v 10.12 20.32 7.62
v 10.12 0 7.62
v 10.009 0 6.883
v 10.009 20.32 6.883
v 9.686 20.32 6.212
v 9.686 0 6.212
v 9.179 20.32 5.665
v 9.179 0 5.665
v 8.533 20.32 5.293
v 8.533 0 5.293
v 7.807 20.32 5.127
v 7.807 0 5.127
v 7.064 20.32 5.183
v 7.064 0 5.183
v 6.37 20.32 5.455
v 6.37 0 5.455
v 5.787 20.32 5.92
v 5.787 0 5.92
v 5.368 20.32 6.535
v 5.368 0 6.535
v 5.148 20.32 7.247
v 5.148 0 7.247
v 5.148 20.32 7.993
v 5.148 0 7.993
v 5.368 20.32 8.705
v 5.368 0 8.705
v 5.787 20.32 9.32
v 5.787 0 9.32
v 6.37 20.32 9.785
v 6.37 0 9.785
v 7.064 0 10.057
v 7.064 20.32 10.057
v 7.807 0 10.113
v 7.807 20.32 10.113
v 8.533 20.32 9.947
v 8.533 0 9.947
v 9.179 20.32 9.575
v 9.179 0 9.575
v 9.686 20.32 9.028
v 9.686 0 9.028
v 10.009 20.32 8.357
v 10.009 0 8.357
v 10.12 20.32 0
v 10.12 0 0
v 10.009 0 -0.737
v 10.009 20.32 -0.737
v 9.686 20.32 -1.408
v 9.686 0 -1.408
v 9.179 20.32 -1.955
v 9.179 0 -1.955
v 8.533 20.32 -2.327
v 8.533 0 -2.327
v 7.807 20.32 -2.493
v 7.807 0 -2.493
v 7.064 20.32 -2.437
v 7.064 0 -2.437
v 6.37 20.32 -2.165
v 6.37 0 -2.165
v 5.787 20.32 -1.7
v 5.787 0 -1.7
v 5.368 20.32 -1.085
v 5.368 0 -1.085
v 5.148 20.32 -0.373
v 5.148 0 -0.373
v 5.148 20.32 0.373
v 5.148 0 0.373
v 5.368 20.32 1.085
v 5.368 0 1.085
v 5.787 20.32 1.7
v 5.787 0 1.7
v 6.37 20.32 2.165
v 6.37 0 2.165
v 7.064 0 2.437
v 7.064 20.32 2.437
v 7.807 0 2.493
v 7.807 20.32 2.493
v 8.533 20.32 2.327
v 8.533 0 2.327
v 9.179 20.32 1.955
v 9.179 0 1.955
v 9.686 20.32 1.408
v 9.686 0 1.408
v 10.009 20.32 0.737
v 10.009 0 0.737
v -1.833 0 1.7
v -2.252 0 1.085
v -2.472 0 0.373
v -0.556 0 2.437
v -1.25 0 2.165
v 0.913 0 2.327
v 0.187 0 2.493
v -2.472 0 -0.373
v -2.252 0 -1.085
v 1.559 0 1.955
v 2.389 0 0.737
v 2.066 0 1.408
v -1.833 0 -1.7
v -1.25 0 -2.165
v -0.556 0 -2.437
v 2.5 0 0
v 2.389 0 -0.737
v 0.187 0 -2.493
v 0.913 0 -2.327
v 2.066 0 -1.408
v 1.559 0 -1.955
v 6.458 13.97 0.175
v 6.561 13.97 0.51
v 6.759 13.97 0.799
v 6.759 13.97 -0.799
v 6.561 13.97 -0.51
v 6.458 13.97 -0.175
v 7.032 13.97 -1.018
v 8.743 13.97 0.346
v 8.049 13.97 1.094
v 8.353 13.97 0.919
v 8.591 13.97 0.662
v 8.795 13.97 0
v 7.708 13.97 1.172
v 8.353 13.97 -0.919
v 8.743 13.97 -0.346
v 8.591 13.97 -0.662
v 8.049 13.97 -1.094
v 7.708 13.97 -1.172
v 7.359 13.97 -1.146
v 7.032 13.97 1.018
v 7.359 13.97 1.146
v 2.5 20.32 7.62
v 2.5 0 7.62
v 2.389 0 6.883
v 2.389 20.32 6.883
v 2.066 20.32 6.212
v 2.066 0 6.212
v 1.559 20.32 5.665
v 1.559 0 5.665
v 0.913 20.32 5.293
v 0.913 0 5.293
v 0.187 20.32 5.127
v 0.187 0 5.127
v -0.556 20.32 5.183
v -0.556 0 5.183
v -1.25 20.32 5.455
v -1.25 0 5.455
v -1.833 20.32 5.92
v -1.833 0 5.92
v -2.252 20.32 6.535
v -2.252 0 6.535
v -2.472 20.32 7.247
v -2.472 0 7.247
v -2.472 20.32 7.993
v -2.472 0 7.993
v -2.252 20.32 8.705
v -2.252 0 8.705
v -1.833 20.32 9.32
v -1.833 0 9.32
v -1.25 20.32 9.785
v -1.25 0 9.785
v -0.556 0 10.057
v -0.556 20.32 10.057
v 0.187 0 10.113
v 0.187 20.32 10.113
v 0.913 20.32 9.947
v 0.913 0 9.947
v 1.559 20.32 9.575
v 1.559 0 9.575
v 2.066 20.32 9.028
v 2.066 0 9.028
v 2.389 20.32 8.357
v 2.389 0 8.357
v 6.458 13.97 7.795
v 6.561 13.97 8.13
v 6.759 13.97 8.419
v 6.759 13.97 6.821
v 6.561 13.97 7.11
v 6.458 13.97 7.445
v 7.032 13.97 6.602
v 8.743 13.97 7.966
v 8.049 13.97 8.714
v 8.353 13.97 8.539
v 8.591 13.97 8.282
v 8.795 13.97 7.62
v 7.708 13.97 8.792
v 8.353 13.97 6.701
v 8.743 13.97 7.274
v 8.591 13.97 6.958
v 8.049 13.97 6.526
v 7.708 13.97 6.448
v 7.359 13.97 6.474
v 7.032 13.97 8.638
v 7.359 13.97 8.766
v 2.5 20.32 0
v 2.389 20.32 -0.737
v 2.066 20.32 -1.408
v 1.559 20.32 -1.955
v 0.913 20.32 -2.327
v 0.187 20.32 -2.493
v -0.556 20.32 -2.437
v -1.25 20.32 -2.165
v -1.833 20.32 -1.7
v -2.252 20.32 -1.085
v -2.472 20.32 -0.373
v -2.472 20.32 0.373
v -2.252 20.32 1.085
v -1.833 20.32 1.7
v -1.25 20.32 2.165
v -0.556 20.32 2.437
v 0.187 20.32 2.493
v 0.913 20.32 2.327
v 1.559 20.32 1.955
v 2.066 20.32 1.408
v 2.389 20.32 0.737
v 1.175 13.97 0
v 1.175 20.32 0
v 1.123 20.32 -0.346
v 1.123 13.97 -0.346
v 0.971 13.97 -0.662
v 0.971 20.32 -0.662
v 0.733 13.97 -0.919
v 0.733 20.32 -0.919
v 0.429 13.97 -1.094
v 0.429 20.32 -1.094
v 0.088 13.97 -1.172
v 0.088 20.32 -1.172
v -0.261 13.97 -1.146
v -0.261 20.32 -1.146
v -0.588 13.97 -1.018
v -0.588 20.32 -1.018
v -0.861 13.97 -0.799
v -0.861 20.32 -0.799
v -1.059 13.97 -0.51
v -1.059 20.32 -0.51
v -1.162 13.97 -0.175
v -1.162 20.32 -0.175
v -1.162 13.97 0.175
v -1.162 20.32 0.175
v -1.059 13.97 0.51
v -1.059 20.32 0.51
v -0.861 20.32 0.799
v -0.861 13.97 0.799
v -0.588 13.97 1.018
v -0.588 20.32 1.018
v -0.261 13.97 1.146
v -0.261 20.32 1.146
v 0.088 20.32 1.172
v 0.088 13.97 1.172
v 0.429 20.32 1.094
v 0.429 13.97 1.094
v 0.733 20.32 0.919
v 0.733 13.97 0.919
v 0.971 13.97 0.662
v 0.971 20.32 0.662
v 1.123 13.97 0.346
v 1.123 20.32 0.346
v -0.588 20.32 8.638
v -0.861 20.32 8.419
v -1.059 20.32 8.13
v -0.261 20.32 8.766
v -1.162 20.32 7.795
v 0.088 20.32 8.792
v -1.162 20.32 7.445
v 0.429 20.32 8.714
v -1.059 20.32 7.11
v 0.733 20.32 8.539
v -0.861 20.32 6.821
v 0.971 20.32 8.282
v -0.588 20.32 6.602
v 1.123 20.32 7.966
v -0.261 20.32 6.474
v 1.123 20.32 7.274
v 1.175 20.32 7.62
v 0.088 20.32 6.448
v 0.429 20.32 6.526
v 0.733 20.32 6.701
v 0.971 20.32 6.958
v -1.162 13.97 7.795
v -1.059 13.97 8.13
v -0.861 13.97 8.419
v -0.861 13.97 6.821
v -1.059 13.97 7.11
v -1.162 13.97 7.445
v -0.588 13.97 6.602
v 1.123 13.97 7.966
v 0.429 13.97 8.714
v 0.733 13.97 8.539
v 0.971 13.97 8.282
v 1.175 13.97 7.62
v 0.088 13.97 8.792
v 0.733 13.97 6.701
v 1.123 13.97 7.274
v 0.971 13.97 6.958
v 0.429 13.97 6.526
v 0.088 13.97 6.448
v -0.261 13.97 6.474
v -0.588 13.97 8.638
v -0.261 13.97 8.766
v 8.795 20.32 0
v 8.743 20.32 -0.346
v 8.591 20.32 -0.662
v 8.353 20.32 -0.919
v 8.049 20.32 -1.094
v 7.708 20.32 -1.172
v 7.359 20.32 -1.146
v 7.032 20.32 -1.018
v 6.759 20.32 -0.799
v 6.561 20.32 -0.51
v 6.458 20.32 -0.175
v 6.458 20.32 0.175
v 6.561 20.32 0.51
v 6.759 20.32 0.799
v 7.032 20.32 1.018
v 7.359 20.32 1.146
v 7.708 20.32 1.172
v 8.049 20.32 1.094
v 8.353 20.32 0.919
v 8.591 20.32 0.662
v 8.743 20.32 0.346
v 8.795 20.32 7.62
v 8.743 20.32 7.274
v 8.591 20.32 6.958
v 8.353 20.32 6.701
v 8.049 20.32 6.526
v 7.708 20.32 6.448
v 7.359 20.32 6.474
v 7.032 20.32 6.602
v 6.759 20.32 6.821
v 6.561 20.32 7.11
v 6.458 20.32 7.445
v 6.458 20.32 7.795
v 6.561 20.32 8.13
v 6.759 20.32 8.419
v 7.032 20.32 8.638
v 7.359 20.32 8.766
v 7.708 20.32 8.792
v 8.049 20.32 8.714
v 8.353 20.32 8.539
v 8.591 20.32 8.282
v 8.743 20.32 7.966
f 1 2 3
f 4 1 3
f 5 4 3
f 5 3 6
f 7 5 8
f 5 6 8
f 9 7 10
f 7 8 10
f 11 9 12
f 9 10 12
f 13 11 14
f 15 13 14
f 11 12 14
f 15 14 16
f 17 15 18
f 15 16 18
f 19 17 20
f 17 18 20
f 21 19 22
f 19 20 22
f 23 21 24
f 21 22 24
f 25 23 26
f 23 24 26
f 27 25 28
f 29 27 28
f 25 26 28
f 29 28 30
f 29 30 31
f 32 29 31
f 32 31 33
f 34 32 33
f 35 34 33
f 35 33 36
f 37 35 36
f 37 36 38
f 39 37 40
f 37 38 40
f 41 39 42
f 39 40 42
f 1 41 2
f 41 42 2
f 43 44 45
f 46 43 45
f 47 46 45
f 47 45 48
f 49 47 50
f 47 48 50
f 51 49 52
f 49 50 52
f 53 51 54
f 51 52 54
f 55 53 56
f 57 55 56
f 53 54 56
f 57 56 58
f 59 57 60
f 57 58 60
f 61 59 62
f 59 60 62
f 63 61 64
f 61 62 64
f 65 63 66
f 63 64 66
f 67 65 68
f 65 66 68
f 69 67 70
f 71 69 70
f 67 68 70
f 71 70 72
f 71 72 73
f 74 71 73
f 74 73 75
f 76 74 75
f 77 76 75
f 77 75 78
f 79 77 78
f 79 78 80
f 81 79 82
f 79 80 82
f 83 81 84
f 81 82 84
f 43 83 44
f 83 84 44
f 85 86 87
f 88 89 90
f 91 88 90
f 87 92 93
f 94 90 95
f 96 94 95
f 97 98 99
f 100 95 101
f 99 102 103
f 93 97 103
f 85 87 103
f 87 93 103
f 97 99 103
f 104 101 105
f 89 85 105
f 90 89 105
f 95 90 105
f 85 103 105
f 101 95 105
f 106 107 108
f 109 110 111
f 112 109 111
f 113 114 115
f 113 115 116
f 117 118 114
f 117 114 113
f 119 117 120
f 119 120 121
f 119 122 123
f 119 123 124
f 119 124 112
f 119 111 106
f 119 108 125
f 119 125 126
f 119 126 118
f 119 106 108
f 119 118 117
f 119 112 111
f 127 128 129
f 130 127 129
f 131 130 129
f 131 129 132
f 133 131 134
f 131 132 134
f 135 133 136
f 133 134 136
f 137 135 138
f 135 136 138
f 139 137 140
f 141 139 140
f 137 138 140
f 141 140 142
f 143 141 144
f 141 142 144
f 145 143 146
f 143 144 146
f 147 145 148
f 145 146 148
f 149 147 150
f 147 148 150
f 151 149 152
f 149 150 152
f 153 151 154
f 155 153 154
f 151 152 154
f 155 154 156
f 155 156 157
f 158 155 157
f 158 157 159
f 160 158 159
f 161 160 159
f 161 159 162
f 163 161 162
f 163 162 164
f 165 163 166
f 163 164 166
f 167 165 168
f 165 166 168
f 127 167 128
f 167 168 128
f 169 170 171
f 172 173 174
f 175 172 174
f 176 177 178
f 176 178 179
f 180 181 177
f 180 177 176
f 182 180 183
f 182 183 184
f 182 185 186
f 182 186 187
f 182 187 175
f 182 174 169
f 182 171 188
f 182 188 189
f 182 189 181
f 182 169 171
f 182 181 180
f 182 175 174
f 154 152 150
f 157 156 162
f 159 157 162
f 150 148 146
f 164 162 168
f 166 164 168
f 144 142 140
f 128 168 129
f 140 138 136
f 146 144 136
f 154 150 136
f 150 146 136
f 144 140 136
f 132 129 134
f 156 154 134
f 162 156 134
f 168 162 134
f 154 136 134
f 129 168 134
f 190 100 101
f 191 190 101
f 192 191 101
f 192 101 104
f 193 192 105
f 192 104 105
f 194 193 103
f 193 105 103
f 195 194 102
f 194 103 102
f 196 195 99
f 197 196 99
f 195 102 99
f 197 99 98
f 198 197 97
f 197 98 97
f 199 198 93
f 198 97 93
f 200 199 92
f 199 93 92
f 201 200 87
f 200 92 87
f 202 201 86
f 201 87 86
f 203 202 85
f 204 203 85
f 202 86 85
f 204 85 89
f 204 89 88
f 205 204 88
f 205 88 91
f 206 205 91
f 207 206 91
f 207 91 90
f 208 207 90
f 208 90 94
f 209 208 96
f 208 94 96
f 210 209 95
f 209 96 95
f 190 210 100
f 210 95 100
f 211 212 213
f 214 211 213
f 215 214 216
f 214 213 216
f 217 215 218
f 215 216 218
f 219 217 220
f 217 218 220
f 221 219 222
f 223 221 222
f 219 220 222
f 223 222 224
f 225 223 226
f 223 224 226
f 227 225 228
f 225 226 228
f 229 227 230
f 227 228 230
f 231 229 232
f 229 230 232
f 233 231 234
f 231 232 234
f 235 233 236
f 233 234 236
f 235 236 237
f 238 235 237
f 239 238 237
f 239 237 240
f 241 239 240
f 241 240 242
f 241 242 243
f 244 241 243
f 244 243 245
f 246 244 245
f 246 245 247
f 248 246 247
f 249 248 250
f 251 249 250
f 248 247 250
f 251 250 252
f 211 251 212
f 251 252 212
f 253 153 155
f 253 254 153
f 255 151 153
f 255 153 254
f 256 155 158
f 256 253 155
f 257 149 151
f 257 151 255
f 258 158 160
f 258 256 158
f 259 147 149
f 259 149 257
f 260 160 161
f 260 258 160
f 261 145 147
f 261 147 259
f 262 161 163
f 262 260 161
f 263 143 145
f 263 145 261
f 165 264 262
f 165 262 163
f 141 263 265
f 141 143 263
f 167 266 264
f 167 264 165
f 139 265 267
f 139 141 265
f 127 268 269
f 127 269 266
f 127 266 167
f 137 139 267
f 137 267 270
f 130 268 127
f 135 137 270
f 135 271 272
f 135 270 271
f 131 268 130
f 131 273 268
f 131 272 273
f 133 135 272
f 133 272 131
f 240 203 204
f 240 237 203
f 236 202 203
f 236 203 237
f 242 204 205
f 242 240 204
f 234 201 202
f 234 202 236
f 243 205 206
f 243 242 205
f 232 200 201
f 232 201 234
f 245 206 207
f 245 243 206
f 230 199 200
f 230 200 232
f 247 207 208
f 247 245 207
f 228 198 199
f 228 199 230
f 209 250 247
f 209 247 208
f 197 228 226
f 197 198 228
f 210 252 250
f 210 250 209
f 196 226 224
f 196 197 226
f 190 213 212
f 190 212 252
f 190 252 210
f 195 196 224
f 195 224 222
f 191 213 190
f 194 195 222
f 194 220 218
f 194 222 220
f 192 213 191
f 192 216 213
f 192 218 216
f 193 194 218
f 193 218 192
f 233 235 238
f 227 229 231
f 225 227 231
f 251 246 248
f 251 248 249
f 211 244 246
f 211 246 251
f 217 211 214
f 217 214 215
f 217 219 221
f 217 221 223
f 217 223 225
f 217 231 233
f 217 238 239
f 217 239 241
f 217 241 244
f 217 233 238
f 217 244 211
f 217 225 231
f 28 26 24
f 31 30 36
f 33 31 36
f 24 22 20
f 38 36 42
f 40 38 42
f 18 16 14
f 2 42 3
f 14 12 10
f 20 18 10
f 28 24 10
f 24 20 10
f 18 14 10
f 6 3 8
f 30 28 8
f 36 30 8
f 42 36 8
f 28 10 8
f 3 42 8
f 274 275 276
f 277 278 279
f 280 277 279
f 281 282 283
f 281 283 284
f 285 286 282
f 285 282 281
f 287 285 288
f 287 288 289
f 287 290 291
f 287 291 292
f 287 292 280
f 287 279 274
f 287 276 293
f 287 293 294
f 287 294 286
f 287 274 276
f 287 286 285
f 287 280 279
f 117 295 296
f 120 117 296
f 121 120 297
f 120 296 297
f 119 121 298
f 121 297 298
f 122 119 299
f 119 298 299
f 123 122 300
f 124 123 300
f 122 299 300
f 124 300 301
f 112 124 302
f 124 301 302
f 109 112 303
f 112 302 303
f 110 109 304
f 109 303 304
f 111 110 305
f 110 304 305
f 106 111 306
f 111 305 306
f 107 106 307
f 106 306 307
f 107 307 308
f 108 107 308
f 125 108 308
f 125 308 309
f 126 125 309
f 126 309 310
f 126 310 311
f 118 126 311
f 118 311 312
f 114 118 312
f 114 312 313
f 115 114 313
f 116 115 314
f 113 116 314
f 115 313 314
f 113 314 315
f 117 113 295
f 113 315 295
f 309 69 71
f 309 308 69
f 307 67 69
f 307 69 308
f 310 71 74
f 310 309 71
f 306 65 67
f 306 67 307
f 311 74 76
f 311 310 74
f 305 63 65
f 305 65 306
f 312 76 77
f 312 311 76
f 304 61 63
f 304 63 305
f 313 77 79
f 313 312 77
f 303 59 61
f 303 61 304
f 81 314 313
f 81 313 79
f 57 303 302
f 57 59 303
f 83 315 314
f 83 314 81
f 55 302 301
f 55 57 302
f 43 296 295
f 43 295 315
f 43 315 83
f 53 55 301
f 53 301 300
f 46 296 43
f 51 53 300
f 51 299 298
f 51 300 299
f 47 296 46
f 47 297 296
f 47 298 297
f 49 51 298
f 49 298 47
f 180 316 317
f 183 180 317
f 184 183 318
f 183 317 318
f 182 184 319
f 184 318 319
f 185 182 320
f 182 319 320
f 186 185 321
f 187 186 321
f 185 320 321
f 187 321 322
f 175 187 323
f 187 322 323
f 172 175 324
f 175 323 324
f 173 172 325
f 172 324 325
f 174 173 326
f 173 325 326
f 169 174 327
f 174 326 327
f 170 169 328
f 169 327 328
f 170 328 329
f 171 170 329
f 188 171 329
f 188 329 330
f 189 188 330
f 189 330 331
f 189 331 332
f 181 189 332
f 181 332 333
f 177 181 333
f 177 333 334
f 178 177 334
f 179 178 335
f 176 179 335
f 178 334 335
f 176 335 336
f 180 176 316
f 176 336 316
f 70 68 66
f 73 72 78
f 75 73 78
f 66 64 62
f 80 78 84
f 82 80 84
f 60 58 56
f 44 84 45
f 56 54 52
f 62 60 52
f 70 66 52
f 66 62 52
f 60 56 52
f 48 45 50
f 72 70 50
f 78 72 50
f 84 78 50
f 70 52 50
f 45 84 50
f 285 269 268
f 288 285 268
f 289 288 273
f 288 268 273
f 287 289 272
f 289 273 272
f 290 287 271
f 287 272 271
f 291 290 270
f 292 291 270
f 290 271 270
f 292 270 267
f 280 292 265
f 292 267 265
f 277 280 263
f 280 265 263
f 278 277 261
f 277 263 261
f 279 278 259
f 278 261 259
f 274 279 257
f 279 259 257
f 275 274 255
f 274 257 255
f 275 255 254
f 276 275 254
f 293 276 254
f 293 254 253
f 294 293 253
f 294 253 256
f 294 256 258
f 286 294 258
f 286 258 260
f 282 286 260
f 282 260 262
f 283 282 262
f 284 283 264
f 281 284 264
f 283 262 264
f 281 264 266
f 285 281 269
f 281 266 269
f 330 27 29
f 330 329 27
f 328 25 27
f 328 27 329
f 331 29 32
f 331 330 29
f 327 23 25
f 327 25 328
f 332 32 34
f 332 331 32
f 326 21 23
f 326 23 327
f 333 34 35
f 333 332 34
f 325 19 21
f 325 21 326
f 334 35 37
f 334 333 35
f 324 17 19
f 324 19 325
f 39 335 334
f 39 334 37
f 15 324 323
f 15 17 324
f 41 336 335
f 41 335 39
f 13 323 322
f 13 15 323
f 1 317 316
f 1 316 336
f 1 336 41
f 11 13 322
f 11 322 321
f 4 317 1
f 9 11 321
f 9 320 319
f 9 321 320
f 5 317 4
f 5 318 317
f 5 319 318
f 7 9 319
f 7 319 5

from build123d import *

# Parameters (mm, degrees)
SKETCH2_R           = 2.5
BOSS_EXTRUDE2_DEPTH = 20.32
SKETCH4_R           = 1.175
CUT_EXTRUDE1_DEPTH  = 6.35
LPATTERN1_COUNT     = 2
LPATTERN1_PITCH     = 7.62
LPATTERN1_2_COUNT   = 2
LPATTERN1_2_PITCH   = 7.62


with BuildPart() as part:
    # Sketch2 → Boss-Extrude2 (new body)
    with BuildSketch(Plane(origin=(0, 0, 0), x_dir=(1, 0, 0), z_dir=(0, 1, 0))):
        Circle(SKETCH2_R)
    extrude(amount=BOSS_EXTRUDE2_DEPTH)

    # Sketch4 → Cut-Extrude1 (cut)
    with BuildSketch(Plane(origin=(0, 20.32, 0), x_dir=(1, 0, 0), z_dir=(0, 1, 0))):
        Circle(SKETCH4_R)
    extrude(amount=-CUT_EXTRUDE1_DEPTH, mode=Mode.SUBTRACT)


with BuildPart() as lpattern1_1:
    # LPattern1: pattern copy
    add(part.part.moved(Location(Vector(0, 0, 1) * (1 * LPATTERN1_PITCH))))


with BuildPart() as lpattern1_2_1:
    # LPattern1 2: pattern copy
    add(part.part.moved(Location(Vector(1, 0, 0) * (1 * LPATTERN1_2_PITCH))))


with BuildPart() as lpattern1_2_2:
    # LPattern1 2: pattern copy
    add(lpattern1_1.part.moved(Location(Vector(1, 0, 0) * (1 * LPATTERN1_2_PITCH))))


solid = Compound([part.part, lpattern1_1.part, lpattern1_2_1.part, lpattern1_2_2.part])
